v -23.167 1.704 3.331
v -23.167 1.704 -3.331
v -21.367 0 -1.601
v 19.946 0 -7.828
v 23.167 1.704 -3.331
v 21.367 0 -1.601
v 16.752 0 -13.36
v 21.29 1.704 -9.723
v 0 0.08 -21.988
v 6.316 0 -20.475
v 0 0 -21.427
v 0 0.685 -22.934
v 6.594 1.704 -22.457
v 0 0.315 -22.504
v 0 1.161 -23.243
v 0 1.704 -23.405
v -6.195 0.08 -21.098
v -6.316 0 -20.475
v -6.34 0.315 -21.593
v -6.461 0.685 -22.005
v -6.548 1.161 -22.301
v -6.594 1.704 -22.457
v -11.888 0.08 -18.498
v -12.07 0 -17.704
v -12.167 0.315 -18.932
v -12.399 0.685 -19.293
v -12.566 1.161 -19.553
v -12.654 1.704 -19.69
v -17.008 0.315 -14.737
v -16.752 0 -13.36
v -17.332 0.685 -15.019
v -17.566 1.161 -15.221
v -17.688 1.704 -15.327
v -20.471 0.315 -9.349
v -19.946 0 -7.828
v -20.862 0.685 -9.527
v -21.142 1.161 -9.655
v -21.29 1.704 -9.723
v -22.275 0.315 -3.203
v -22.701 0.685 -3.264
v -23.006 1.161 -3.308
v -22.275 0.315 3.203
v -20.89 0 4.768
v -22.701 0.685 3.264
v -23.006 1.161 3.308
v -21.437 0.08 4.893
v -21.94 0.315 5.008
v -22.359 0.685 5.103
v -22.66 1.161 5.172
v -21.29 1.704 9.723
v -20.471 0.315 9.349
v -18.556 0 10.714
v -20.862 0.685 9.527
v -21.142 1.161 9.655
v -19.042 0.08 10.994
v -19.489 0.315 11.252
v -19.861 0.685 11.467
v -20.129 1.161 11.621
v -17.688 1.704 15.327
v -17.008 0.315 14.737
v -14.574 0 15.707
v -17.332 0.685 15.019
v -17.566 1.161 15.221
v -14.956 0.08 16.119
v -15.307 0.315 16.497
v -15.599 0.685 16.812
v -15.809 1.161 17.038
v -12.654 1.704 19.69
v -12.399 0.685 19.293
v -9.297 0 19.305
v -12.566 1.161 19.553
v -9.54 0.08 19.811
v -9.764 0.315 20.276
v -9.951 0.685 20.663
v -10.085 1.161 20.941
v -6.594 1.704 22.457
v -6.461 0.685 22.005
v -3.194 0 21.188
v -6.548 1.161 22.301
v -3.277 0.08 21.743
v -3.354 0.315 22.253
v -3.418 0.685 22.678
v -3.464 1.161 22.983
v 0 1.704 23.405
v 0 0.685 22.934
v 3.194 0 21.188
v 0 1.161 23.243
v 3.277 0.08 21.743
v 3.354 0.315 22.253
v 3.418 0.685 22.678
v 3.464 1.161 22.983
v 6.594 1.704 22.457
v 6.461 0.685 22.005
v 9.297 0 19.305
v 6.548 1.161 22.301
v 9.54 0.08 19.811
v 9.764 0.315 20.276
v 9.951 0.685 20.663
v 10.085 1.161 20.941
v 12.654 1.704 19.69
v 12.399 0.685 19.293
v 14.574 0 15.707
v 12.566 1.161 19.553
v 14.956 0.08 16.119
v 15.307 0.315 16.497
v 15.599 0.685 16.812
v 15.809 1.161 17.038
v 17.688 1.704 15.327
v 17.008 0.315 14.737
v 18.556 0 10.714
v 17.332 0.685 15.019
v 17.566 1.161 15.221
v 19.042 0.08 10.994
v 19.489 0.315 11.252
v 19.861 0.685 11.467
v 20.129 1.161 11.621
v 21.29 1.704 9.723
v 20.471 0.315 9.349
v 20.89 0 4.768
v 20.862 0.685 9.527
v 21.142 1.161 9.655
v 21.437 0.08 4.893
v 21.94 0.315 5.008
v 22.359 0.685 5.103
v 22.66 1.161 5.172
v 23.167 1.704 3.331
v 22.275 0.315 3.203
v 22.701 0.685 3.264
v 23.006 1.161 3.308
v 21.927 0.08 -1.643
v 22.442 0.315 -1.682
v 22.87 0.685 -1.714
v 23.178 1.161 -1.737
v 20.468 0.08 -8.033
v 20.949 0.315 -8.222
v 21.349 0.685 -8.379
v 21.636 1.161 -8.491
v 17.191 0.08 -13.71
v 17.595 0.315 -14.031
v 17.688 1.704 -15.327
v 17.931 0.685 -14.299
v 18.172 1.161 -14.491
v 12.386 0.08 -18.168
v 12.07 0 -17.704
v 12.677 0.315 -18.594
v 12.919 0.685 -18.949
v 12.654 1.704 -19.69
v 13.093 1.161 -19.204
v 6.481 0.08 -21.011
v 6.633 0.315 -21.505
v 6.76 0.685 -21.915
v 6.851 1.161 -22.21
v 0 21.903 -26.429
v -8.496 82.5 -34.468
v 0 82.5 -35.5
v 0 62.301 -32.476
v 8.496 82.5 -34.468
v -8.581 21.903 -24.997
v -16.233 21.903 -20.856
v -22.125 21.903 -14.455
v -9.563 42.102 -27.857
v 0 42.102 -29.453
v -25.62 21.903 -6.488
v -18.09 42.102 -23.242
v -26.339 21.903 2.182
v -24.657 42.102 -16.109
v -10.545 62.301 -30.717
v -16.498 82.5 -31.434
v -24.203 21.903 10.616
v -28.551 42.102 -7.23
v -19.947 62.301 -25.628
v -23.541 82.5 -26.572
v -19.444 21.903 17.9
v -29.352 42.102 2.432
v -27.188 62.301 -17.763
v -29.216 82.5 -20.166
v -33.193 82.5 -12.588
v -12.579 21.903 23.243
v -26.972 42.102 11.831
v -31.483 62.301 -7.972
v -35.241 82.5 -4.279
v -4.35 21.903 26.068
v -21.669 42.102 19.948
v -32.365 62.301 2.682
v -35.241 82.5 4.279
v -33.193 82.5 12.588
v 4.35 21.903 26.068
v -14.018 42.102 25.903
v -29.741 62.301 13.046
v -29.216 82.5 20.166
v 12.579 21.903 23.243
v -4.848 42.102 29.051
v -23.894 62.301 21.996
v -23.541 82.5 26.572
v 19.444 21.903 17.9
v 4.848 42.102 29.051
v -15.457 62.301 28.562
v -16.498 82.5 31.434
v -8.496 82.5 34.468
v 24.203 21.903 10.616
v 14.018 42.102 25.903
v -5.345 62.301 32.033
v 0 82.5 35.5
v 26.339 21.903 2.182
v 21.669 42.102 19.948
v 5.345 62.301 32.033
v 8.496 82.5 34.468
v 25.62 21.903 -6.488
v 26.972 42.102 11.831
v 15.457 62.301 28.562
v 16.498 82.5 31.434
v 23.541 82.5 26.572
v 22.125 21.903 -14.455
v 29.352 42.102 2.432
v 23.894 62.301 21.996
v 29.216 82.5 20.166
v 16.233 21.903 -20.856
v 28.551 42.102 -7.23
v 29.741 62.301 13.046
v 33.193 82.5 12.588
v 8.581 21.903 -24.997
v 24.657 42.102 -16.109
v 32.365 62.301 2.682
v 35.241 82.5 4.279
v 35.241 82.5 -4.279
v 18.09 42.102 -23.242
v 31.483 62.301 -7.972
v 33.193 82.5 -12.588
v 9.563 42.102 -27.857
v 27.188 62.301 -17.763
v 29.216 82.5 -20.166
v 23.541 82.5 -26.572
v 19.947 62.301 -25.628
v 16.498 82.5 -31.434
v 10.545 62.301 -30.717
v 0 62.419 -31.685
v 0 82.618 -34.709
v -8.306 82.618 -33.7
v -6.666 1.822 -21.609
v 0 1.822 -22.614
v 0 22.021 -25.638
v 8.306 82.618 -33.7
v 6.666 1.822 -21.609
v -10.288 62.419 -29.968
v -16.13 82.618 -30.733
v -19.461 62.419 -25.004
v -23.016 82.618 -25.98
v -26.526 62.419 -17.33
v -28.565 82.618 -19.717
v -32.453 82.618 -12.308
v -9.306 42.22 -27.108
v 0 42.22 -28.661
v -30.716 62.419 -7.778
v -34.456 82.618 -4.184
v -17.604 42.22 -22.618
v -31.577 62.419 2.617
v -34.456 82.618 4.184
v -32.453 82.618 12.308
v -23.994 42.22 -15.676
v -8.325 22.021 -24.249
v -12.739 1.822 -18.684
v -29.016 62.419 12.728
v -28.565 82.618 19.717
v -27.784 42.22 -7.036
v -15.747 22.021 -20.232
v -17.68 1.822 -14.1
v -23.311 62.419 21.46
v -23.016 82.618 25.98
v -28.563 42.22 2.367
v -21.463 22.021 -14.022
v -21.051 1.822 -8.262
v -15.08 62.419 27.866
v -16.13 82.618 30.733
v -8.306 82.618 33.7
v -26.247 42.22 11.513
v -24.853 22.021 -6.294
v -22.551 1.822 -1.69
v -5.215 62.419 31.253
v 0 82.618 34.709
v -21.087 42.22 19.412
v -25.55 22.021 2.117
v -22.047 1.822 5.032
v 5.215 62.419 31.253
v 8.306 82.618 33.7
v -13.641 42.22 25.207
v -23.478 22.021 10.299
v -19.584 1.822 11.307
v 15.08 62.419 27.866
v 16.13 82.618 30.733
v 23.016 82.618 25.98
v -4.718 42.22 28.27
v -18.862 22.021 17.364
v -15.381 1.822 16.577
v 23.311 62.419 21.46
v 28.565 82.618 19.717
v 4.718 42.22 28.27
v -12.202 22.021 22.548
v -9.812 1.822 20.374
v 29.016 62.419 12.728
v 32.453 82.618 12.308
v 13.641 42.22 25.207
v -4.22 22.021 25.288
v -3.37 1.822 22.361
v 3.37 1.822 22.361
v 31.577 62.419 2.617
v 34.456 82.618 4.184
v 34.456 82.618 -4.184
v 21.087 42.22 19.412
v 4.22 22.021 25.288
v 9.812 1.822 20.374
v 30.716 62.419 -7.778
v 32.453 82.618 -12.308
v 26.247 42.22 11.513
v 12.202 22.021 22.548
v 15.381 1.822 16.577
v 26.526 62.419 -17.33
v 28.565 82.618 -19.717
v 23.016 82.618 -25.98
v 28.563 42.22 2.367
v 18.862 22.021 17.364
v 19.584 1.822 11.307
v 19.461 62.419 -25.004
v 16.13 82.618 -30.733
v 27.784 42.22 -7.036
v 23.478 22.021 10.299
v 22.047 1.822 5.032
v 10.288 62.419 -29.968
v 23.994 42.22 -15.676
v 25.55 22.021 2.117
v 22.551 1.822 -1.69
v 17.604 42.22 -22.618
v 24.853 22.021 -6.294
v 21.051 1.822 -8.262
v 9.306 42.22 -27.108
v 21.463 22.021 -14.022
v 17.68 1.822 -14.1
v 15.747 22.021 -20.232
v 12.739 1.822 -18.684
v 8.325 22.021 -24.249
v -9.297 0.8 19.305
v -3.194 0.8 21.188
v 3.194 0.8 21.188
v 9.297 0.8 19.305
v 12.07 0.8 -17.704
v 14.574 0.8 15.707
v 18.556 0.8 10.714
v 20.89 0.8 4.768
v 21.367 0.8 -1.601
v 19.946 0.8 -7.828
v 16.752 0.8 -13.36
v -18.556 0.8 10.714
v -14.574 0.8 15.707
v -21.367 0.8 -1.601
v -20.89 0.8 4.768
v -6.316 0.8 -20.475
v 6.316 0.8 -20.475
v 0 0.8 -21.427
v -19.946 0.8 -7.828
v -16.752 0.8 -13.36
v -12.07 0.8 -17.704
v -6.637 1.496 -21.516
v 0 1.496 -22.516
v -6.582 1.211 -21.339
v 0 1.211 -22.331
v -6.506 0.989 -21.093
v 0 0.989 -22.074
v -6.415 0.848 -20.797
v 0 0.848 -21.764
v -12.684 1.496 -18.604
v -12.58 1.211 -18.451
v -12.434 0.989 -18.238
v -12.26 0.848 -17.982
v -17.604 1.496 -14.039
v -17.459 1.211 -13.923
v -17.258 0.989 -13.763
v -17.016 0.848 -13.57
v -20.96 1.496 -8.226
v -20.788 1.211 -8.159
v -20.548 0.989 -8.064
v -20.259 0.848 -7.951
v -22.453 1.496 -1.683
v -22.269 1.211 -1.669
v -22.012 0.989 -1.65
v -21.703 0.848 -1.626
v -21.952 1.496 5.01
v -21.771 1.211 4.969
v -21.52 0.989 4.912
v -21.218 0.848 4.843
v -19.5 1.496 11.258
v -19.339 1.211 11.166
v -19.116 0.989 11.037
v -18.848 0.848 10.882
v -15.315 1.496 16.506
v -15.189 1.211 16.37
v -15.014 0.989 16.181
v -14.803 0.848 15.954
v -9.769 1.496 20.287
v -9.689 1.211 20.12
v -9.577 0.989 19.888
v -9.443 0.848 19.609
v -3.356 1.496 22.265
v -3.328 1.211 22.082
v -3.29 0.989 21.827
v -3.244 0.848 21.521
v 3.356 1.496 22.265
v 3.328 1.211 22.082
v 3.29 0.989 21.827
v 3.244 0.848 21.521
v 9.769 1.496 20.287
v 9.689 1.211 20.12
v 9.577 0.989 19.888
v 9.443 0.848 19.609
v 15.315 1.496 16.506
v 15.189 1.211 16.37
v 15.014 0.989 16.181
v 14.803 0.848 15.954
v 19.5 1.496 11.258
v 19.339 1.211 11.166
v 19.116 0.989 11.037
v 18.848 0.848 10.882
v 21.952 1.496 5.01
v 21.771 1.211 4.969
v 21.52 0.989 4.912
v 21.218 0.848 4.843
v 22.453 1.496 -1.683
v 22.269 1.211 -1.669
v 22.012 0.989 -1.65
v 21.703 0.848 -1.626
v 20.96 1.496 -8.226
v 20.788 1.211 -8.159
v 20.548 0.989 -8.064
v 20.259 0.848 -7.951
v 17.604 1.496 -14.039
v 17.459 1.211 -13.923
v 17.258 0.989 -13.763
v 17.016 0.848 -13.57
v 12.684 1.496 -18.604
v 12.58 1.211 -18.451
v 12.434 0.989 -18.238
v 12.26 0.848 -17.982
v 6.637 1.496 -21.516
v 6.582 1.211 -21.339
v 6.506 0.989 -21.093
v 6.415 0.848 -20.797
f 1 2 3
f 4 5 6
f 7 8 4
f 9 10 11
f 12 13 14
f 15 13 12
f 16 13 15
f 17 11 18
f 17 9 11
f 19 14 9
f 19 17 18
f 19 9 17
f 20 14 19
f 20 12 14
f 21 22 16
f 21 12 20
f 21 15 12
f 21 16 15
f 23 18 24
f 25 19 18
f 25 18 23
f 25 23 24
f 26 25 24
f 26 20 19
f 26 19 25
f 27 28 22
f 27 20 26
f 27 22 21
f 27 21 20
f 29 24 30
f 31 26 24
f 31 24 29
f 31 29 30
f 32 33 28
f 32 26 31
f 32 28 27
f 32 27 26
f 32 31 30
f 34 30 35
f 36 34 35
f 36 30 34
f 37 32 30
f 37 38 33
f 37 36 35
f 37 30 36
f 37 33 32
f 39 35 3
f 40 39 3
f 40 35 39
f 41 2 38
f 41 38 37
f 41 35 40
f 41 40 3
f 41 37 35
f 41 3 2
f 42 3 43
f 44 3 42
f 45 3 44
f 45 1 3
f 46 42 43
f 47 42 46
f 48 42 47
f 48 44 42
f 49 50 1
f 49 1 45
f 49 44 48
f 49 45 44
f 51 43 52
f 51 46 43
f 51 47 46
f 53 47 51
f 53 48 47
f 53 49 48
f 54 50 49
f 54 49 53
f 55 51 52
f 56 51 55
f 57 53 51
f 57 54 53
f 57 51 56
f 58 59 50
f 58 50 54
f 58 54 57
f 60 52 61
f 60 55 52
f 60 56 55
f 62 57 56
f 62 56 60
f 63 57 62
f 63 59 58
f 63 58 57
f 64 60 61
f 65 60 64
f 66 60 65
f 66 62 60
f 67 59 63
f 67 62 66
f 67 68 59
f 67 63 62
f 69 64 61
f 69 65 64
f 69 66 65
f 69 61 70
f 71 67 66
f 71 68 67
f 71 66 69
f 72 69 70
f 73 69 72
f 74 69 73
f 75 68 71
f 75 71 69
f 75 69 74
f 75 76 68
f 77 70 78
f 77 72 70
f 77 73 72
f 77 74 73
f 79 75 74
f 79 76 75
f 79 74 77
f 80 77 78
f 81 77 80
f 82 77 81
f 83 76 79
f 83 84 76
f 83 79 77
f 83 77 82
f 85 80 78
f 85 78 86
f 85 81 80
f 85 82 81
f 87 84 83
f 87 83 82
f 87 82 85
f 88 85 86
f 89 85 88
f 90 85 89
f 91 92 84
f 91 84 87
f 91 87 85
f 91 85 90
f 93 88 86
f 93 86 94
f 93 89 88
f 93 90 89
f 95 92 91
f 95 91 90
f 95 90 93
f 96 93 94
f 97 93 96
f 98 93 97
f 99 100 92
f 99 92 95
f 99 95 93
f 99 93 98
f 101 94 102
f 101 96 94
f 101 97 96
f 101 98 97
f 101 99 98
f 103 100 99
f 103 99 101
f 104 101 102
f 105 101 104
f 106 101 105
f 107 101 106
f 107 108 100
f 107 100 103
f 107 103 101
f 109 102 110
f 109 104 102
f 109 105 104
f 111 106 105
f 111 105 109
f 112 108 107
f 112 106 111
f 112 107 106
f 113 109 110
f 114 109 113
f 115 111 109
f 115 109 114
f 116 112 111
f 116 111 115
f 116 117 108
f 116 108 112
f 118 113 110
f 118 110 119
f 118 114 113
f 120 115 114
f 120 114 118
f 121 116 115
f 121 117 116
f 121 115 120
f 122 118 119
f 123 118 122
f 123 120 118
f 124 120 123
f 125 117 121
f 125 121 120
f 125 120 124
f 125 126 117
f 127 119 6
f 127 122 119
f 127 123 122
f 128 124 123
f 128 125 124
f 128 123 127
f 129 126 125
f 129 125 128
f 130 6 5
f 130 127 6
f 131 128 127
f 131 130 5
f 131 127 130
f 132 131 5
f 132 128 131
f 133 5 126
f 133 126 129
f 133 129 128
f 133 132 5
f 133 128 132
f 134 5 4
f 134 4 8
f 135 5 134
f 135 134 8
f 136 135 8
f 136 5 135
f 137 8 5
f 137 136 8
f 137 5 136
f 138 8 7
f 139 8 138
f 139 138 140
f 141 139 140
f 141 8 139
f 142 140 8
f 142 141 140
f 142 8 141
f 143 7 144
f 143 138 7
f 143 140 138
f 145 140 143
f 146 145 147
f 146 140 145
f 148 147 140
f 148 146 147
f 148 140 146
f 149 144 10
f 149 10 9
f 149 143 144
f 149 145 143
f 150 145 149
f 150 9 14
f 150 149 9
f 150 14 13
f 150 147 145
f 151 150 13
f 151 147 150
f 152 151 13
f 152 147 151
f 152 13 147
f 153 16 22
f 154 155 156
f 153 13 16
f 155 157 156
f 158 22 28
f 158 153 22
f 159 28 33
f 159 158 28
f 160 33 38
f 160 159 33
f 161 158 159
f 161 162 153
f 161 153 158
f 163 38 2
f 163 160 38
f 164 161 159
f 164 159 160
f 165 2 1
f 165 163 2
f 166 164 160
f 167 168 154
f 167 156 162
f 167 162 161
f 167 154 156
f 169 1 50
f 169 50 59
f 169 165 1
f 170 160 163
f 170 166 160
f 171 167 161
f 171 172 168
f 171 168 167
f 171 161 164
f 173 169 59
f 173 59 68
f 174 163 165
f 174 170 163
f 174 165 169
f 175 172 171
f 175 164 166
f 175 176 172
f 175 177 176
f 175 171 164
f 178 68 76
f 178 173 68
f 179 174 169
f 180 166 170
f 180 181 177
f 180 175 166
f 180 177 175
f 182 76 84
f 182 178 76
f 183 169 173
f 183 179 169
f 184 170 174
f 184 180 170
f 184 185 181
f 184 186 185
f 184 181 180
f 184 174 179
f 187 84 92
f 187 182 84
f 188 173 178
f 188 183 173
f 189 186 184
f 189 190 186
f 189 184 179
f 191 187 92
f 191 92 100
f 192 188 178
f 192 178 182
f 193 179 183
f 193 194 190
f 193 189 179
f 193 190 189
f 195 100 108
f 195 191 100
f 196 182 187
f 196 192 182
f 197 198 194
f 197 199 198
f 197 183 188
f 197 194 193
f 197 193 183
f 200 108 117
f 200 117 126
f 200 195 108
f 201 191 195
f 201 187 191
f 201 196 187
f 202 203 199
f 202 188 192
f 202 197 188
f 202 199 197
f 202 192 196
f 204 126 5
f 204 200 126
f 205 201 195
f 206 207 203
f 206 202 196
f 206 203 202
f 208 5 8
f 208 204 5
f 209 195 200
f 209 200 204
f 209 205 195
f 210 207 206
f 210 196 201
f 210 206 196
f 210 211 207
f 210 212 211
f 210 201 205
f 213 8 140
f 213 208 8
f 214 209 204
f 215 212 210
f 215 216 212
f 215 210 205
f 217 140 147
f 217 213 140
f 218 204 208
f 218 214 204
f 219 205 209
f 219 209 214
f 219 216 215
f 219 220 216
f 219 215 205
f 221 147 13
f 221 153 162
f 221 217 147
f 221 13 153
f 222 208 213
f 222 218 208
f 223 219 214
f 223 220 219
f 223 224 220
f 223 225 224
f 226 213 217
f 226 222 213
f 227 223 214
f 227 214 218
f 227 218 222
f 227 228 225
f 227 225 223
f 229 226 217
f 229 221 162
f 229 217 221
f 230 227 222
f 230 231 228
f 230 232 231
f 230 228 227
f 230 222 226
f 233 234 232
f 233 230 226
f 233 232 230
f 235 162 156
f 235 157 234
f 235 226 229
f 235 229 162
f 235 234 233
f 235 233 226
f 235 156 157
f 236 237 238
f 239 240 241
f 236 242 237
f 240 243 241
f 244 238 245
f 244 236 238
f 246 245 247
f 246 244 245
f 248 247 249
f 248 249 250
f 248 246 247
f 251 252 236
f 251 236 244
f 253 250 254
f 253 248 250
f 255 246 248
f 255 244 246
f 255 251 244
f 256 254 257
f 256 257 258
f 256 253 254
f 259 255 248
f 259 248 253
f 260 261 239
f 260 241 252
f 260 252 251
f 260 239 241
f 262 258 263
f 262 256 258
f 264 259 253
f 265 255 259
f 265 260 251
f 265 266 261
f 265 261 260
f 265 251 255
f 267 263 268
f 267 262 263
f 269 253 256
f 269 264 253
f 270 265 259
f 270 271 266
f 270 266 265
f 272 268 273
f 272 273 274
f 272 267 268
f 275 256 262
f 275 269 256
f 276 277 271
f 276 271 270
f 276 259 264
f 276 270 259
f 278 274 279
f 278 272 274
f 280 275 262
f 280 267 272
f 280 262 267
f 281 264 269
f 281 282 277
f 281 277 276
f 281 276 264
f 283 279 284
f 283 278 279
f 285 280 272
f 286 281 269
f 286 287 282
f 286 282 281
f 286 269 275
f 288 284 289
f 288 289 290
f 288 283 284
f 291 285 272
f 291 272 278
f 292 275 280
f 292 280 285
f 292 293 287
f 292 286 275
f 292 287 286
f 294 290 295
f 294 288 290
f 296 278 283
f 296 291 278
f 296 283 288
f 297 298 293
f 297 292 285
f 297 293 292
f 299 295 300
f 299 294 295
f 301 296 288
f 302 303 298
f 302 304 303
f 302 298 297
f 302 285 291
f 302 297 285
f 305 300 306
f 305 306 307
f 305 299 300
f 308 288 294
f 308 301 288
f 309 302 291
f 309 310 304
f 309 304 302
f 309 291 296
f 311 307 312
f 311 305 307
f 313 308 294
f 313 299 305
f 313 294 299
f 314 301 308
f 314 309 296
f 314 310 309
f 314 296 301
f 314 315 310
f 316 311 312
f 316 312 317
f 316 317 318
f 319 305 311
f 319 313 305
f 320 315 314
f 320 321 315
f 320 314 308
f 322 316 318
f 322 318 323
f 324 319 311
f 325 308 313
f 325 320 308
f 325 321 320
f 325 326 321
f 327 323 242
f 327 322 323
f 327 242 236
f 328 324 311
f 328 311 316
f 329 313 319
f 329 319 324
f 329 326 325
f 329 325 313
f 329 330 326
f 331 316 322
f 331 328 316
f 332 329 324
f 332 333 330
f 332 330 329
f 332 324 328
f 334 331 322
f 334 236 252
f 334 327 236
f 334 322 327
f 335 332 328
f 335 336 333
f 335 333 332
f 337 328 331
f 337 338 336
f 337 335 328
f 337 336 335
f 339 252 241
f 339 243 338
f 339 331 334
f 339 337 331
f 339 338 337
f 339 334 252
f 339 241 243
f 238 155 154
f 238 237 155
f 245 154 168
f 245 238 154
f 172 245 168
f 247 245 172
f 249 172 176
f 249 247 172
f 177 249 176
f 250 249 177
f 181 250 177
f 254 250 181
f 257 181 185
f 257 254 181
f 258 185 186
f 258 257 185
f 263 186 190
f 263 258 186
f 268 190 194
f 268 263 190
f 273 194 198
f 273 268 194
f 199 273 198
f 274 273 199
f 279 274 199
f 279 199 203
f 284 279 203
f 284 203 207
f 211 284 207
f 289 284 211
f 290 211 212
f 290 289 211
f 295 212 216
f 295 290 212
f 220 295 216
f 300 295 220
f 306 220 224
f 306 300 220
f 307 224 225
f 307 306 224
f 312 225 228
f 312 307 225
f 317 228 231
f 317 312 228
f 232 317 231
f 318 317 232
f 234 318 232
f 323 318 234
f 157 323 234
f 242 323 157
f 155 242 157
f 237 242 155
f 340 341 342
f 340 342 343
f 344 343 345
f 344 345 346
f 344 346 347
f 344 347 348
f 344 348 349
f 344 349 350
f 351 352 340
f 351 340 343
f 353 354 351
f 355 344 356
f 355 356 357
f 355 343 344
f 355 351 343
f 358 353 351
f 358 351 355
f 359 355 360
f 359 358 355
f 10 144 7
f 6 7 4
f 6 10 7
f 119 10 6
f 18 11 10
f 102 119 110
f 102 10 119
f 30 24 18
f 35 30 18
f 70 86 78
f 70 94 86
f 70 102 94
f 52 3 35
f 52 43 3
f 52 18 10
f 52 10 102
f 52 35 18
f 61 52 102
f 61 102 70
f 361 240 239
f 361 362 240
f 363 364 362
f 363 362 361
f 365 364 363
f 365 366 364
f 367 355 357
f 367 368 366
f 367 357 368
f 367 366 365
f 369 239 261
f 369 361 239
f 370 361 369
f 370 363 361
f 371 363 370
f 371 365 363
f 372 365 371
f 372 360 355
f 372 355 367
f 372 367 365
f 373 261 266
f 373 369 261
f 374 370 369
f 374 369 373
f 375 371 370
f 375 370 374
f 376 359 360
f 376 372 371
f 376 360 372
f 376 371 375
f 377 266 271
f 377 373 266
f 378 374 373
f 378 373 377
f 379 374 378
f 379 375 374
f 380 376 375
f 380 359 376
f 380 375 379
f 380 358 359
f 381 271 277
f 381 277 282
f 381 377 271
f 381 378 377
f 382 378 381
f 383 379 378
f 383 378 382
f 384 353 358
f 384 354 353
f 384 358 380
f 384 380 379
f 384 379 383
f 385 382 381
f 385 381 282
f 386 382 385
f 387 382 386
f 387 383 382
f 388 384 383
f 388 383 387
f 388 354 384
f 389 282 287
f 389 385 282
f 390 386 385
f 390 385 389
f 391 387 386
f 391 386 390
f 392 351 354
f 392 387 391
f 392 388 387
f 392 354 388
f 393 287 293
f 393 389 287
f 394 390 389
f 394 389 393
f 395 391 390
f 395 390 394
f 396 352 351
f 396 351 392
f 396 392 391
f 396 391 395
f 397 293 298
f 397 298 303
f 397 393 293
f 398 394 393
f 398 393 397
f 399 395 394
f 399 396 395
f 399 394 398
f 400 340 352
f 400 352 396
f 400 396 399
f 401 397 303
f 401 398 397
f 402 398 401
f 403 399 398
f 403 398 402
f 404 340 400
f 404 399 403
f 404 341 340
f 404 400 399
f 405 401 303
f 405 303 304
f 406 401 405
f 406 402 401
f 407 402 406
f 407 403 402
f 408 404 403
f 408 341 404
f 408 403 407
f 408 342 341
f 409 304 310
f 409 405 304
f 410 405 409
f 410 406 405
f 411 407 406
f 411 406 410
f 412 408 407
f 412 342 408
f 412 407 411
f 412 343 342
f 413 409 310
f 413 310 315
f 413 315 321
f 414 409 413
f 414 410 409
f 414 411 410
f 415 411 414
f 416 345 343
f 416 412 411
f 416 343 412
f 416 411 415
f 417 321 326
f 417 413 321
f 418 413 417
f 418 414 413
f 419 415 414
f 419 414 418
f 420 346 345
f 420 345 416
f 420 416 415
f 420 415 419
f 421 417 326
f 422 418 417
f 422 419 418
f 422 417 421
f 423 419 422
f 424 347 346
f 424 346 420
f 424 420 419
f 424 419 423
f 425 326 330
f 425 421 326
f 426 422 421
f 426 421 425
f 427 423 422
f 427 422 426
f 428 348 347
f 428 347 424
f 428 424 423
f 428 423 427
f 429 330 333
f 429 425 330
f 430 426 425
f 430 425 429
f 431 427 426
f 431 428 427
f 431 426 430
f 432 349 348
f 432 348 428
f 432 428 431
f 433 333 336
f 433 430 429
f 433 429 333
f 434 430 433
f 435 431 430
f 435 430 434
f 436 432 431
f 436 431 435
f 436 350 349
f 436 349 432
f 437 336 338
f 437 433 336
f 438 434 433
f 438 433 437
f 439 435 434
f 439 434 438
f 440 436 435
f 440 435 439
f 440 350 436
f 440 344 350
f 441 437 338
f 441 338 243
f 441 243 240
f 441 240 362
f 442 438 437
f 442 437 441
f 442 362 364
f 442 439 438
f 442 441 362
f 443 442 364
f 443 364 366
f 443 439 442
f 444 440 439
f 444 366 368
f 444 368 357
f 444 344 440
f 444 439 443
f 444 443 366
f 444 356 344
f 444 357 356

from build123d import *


with BuildPart() as part:
    # Sketch1 → Revolve-Thin1 (revolve)
    with BuildSketch(Plane.XY, mode=Mode.PRIVATE) as revolve_thin1_sk:
        with BuildLine():
            Line((0, 0), (21.427108912, 0))
            ThreePointArc((21.427108912, 0), (22.732446148, 0.484712997), (23.40506946, 1.7039053))
            Line((23.40506946, 1.7039053), (35.5, 82.5))
            Line((35.5, 82.5), (34.708815781, 82.61843788))
            Line((34.708815781, 82.61843788), (22.613885241, 1.82234318))
            ThreePointArc((22.613885241, 1.82234318), (22.210311254, 1.090827798), (21.427108912, 0.8))
            Line((21.427108912, 0.8), (0, 0.8))
            Line((0, 0.8), (0, 0))
        make_face()
    revolve(revolve_thin1_sk.sketch.rotate(Axis((0, 0, 0), (0, 1, 0)), 90), axis=Axis((0, 0, 0), (0, 1, 0)))


solid = part.part
